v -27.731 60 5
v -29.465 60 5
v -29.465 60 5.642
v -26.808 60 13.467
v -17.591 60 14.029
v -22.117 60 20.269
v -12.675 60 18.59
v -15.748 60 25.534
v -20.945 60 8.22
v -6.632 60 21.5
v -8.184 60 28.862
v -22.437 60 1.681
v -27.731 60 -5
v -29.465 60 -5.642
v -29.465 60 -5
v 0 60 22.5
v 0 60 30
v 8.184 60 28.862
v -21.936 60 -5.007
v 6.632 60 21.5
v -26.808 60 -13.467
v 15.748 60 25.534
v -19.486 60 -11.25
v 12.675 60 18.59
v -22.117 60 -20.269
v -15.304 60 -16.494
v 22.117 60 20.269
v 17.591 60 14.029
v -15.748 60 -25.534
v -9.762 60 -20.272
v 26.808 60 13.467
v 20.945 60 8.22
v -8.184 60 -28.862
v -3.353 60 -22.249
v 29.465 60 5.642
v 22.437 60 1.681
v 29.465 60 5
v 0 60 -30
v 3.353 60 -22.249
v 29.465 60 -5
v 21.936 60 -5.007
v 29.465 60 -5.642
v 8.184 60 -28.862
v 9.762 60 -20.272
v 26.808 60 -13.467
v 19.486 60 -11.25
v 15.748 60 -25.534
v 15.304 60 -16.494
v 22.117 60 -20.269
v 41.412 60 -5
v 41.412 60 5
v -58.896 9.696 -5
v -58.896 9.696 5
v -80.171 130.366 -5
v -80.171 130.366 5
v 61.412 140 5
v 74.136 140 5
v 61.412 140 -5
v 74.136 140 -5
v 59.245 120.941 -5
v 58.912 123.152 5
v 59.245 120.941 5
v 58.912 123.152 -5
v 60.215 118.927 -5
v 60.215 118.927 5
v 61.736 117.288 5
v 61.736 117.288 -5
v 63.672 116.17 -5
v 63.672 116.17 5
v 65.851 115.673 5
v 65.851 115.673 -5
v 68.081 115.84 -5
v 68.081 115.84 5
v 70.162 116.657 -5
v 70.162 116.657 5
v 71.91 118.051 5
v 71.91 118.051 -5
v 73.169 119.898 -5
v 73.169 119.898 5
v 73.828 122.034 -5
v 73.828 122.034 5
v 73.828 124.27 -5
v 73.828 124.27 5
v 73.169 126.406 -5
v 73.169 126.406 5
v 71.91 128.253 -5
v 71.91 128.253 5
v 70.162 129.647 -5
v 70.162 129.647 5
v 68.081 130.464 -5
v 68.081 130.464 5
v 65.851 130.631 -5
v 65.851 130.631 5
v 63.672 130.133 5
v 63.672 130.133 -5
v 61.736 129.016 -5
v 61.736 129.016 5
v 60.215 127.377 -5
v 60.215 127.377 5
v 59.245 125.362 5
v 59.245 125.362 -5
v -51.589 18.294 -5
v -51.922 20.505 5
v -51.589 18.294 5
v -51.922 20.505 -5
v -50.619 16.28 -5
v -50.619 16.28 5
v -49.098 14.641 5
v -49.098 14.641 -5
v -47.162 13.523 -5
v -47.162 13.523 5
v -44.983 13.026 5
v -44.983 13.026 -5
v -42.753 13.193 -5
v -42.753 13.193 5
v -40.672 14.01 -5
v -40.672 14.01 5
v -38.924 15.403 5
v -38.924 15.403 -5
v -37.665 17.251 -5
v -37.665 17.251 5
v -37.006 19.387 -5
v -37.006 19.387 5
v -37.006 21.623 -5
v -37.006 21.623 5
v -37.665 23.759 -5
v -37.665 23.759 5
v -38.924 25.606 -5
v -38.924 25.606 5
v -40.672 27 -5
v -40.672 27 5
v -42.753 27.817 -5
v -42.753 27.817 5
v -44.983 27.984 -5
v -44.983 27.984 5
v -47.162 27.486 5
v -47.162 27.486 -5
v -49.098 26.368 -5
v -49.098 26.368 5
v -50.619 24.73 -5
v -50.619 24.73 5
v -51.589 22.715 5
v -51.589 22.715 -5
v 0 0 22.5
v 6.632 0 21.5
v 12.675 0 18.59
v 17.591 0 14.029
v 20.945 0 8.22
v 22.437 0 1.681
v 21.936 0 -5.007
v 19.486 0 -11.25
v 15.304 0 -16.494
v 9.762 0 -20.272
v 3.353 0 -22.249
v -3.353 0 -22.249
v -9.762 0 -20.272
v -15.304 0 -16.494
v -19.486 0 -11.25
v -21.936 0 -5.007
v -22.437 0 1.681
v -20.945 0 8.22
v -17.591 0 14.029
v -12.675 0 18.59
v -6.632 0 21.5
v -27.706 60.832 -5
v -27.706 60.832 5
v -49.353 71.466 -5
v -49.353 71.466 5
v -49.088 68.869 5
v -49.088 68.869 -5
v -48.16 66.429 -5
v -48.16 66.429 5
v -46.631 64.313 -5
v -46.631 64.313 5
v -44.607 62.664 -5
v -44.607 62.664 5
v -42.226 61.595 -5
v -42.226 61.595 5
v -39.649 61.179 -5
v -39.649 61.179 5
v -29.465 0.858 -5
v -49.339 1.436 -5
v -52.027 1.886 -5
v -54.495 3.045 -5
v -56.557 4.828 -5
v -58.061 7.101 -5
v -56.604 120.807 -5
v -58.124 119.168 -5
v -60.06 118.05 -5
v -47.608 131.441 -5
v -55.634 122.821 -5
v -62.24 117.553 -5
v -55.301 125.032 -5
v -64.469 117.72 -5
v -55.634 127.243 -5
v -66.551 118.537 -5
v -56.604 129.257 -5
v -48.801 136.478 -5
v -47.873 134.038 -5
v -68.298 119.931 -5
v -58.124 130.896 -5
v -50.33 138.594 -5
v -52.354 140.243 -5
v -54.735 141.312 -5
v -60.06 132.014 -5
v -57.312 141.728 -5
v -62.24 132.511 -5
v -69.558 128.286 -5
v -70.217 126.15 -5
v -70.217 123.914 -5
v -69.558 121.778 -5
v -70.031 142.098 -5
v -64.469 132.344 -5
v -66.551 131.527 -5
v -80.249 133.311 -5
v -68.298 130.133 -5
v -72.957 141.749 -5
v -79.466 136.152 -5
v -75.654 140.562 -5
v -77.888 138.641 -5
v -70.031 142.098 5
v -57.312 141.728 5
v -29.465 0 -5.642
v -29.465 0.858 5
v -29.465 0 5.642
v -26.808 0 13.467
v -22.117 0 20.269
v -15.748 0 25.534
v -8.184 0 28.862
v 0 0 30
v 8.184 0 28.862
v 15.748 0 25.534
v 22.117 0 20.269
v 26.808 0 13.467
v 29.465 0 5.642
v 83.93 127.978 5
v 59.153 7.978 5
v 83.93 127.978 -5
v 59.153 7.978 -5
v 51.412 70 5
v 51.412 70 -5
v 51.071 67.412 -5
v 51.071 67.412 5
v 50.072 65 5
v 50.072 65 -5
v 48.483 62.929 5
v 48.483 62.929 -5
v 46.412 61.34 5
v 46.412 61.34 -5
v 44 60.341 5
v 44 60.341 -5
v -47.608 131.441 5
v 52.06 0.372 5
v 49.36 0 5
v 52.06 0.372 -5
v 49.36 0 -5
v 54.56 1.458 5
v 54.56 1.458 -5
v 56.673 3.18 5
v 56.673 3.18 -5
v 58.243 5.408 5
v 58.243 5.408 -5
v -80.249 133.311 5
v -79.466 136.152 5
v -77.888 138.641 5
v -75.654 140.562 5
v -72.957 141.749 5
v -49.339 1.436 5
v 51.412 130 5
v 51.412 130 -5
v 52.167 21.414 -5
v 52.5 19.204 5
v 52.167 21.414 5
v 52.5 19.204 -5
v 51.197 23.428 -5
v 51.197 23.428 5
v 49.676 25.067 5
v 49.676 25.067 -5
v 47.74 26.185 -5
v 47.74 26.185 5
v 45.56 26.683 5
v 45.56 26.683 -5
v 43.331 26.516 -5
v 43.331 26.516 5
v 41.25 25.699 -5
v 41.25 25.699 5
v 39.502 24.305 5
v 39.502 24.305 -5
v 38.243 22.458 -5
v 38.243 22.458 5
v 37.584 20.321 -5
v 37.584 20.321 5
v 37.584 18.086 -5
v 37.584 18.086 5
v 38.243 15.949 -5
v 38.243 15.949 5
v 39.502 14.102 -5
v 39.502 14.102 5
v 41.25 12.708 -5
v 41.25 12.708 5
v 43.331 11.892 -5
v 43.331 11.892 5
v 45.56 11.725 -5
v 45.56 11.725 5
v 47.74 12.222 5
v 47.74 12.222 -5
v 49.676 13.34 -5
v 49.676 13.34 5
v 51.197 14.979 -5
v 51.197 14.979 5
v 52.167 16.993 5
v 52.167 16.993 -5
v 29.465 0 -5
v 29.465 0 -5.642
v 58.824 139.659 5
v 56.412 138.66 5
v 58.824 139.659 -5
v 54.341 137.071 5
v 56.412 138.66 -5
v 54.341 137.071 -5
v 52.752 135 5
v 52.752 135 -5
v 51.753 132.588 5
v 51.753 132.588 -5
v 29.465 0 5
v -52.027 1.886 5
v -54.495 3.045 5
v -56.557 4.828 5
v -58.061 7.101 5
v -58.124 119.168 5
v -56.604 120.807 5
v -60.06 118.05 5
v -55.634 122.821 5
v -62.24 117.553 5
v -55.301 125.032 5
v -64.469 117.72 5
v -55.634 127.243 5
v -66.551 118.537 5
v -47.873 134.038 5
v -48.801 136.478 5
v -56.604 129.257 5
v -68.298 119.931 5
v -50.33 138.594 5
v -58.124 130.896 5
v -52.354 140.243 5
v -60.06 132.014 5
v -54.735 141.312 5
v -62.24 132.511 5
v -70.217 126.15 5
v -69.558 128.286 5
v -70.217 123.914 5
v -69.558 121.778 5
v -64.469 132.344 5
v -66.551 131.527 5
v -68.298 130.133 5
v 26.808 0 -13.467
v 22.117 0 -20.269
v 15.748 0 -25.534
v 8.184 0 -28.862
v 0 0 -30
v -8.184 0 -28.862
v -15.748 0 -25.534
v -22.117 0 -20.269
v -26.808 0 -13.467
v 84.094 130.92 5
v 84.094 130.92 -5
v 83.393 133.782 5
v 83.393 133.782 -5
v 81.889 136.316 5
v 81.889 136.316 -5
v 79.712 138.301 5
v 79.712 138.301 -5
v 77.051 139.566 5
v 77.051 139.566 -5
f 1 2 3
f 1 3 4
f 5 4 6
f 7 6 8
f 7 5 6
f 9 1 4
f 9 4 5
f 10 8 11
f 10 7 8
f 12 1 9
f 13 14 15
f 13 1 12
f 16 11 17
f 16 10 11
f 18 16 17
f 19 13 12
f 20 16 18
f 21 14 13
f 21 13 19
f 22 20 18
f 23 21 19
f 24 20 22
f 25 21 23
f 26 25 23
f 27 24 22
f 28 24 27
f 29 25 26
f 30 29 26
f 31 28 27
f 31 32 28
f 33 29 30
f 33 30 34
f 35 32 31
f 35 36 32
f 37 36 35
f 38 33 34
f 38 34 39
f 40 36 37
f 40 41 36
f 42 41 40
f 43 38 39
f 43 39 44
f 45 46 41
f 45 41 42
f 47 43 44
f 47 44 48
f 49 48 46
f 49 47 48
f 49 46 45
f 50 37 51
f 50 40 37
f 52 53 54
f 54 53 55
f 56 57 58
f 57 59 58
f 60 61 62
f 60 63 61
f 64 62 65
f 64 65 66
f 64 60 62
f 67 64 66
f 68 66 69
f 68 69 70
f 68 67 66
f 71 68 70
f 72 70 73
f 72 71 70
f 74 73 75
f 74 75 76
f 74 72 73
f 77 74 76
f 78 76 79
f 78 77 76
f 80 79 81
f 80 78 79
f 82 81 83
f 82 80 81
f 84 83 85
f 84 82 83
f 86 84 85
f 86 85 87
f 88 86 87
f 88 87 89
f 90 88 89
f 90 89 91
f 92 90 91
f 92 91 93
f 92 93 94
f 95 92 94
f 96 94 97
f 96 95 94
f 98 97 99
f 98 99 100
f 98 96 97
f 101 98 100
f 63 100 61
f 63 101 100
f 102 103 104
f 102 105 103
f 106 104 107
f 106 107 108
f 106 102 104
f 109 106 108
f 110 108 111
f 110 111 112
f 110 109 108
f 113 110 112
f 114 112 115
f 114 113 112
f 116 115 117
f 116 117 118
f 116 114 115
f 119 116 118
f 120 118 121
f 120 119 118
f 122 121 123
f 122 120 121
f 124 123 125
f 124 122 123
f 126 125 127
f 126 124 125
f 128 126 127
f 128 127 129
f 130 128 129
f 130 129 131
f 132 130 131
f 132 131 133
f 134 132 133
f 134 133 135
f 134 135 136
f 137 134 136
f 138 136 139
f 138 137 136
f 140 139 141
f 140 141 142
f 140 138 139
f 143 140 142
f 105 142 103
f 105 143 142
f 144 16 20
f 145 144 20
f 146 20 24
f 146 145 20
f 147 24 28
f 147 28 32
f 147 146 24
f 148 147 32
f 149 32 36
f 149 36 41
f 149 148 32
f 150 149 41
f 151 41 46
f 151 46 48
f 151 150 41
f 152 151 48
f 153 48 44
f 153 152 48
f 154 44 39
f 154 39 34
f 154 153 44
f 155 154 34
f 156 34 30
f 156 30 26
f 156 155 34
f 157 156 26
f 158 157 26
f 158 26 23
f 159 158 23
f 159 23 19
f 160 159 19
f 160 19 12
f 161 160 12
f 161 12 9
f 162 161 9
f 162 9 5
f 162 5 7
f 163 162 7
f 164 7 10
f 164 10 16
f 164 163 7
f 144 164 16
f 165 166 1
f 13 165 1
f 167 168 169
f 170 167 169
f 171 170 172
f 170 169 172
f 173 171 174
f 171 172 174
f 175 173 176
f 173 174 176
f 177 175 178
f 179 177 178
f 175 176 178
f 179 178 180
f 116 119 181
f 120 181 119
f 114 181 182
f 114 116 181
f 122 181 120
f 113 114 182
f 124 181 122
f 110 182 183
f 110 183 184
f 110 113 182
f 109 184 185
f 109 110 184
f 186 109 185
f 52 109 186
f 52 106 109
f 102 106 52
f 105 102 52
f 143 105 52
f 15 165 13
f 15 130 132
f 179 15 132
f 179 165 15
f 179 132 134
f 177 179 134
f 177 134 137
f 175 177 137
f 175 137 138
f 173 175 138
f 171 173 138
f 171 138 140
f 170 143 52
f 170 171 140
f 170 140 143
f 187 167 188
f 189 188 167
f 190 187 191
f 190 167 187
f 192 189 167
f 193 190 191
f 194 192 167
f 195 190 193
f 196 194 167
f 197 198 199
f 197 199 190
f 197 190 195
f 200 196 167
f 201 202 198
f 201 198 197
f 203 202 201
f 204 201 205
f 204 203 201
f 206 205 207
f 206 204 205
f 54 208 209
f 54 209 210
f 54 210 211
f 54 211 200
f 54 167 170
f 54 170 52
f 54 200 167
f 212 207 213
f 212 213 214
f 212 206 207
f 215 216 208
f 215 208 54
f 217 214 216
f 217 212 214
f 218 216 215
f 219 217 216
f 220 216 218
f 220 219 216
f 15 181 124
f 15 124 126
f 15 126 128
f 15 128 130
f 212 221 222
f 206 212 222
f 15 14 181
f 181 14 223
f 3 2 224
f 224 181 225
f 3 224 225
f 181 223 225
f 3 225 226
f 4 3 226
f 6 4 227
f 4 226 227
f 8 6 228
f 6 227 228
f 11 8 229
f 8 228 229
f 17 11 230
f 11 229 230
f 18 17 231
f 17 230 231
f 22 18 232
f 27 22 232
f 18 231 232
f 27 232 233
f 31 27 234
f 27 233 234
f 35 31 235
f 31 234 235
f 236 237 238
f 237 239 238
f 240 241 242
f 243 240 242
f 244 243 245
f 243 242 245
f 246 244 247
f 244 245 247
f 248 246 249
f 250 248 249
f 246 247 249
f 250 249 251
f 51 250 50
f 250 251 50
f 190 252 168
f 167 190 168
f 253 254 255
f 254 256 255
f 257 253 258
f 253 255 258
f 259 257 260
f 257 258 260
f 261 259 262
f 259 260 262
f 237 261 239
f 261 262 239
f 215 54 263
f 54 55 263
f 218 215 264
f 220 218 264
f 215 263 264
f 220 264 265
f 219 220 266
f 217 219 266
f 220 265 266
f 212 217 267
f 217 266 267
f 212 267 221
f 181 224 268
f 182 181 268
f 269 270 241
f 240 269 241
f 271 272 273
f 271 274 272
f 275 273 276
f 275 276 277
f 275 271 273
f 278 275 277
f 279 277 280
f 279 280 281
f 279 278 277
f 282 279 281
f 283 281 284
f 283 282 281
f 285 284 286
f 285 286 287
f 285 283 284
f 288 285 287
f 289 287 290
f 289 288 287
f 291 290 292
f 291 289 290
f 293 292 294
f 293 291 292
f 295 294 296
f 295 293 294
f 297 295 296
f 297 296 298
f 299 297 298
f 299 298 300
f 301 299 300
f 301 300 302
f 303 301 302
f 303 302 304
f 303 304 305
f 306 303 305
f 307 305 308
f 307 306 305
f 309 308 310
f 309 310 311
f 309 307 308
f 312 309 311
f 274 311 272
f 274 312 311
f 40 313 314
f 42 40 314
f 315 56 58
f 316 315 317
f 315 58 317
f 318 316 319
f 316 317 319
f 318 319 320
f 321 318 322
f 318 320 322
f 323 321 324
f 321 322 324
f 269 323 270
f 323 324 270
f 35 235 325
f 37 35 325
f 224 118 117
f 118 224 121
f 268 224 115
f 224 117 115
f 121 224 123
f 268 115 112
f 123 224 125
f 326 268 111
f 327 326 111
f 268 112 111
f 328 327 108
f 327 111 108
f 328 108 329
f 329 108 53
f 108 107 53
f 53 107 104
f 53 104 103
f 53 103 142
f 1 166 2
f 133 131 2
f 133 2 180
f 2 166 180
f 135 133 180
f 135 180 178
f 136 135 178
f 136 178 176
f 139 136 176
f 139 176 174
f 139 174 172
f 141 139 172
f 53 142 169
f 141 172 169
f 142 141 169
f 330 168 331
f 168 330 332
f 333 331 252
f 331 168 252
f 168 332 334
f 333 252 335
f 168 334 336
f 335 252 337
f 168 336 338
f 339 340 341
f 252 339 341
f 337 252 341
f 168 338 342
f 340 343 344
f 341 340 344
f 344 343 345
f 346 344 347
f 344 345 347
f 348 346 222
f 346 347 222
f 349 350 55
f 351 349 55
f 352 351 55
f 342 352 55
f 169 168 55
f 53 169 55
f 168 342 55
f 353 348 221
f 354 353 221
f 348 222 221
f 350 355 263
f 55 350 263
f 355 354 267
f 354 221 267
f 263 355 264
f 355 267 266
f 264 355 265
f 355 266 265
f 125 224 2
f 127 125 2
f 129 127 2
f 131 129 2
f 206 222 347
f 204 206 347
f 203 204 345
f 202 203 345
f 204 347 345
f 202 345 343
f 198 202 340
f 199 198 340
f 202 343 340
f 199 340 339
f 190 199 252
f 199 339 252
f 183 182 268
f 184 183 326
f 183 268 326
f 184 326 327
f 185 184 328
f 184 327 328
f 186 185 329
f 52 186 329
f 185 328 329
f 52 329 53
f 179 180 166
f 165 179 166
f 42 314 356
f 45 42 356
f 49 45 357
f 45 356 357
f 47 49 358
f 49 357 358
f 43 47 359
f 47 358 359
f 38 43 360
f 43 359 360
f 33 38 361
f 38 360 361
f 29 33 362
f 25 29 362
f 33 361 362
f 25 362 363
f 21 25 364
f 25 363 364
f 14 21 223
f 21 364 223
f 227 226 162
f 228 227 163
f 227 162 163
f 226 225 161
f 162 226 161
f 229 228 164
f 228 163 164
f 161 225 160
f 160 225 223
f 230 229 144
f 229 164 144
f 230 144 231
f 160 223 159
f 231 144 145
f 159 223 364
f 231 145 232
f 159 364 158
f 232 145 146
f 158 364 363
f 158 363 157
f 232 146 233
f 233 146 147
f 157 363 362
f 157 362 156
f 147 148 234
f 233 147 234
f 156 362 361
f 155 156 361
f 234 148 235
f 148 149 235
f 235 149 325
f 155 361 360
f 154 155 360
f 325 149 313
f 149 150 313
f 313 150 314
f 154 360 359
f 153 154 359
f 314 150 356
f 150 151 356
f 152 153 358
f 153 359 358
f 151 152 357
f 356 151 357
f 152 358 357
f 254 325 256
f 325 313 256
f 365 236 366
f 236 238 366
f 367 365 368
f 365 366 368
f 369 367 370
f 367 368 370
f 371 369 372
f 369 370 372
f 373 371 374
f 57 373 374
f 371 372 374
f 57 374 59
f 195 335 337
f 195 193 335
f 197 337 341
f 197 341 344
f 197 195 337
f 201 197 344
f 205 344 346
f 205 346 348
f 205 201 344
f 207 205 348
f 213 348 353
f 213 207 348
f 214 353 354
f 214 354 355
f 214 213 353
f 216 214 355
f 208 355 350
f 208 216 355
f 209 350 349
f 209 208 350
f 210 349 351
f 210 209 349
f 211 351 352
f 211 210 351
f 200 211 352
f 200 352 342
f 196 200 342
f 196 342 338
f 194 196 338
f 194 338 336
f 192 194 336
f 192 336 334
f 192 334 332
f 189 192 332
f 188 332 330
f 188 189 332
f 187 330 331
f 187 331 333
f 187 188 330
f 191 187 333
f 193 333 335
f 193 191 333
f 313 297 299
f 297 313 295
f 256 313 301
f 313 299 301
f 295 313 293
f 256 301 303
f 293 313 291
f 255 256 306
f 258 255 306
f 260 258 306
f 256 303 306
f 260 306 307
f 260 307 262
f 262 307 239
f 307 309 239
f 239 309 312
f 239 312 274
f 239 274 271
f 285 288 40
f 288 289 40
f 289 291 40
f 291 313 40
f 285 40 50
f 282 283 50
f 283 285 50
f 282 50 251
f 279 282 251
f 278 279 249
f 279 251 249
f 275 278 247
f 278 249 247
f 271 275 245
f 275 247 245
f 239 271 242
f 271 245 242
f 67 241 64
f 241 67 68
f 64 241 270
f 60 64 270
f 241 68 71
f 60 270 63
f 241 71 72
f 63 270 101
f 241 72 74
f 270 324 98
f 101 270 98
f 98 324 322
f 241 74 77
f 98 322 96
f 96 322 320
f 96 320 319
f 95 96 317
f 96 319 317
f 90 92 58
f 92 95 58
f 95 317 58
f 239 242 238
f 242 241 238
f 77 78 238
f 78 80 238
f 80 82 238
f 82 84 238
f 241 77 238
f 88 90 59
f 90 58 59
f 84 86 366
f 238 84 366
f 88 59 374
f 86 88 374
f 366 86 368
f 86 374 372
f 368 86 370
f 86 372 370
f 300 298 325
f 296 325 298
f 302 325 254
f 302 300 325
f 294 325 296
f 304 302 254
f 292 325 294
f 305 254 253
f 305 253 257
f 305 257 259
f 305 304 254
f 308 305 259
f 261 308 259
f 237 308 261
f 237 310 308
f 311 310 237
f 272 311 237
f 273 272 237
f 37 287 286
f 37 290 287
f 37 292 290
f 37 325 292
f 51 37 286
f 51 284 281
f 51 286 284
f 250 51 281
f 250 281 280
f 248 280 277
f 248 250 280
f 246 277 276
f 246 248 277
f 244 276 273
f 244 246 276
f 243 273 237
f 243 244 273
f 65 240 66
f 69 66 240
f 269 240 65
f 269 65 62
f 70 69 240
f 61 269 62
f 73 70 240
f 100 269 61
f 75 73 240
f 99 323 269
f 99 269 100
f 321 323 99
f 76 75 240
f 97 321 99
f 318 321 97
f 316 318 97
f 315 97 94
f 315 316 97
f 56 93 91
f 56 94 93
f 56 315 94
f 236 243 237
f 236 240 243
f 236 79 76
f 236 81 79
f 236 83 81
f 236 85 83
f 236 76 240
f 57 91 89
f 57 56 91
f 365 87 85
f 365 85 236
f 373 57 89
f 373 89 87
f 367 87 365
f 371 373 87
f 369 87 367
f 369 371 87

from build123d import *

# Parameters (mm, degrees)
CROQUIS1_R              = 22.5
SALIENTE_EXTRUIR1_DEPTH = 60
CROQUIS2_R              = 7.5
SALIENTE_EXTRUIR2_DEPTH = 5


with BuildPart() as part:
    # Croquis1 → Saliente-Extruir1 (new body)
    with BuildSketch(Plane(origin=(0, 0, 0), x_dir=(1, 0, 0), z_dir=(0, 1, 0))):
        with BuildLine():
            Line((-29.464610793, 5.64240293), (-29.464610793, -5.64240293))
            ThreePointArc((-29.464610793, -5.64240293), (0, -30), (29.464610793, -5.64240293))
            Line((29.464610793, -5.64240293), (29.464610793, 5.64240293))
            ThreePointArc((29.464610793, 5.64240293), (0, 30), (-29.464610793, 5.64240293))
        make_face()
        with Locations(Location((0, 0, 0), (0, 0, 270))):  # turned: the seam where the file's is
            Circle(CROQUIS1_R, mode=Mode.SUBTRACT)
    extrude(amount=SALIENTE_EXTRUIR1_DEPTH)

    # Croquis2 → Saliente-Extruir2 (add, symmetric)
    with BuildSketch(Plane.XY):
        with BuildLine():
            Line((29.464610793, 60), (29.464610793, 0))
            Line((29.464610793, 0), (49.359858197, 0))
            ThreePointArc((49.359858197, 0), (55.675693274, 2.246921433), (59.153291312, 7.977954546))
            Line((59.153291312, 7.977954546), (83.929633957, 127.977954546))
            ThreePointArc((83.929633957, 127.977954546), (81.889279409, 136.315835078), (74.136200842, 140))
            Line((74.136200842, 140), (61.411819936, 140))
            ThreePointArc((61.411819936, 140), (54.340752124, 137.071067812), (51.411819936, 130))
            Line((51.411819936, 130), (51.411819936, 70))
            ThreePointArc((51.411819936, 70), (48.482887748, 62.928932188), (41.411819936, 60))
            Line((41.411819936, 60), (29.464610793, 60))
        make_face()
        with Locations((45, 19.203564165)):
            Circle(CROQUIS2_R, mode=Mode.SUBTRACT)
        with Locations(Location((66.411819936, 123.15179788, 0), (0, 0, 180))):  # turned: the seam where the file's is
            Circle(CROQUIS2_R, mode=Mode.SUBTRACT)
        with BuildLine():
            Line((-39.648553202, 61.179498685), (-27.706402099, 60.831887788))
            Line((-27.706402099, 60.831887788), (-29.452136484, 0.857289737))
            Line((-29.452136484, 0.857289737), (-49.33896092, 1.436153362))
            ThreePointArc((-49.33896092, 1.436153362), (-55.586746623, 3.865886366), (-58.896124671, 9.695675863))
            Line((-58.896124671, 9.695675863), (-80.17050909, 130.365753854))
            ThreePointArc((-80.17050909, 130.365753854), (-77.888422947, 138.640739128), (-70.031433878, 142.097764037))
            Line((-70.031433878, 142.097764037), (-57.31244004, 141.727540882))
            ThreePointArc((-57.31244004, 141.727540882), (-50.329584837, 138.594111934), (-47.607629428, 131.44081881))
            Line((-47.607629428, 131.44081881), (-49.353363814, 71.466220758))
            ThreePointArc((-49.353363814, 71.466220758), (-46.631408405, 64.312927634), (-39.648553202, 61.179498685))
        make_face()
        with Locations((-62.800531307, 125.03194958)):
            Circle(CROQUIS2_R, mode=Mode.SUBTRACT)
        with Locations(Location((-44.422209834, 20.504734822, 0), (0, 0, 180))):  # turned: the seam where the file's is
            Circle(CROQUIS2_R, mode=Mode.SUBTRACT)
    extrude(amount=SALIENTE_EXTRUIR2_DEPTH, both=True)


solid = part.part
